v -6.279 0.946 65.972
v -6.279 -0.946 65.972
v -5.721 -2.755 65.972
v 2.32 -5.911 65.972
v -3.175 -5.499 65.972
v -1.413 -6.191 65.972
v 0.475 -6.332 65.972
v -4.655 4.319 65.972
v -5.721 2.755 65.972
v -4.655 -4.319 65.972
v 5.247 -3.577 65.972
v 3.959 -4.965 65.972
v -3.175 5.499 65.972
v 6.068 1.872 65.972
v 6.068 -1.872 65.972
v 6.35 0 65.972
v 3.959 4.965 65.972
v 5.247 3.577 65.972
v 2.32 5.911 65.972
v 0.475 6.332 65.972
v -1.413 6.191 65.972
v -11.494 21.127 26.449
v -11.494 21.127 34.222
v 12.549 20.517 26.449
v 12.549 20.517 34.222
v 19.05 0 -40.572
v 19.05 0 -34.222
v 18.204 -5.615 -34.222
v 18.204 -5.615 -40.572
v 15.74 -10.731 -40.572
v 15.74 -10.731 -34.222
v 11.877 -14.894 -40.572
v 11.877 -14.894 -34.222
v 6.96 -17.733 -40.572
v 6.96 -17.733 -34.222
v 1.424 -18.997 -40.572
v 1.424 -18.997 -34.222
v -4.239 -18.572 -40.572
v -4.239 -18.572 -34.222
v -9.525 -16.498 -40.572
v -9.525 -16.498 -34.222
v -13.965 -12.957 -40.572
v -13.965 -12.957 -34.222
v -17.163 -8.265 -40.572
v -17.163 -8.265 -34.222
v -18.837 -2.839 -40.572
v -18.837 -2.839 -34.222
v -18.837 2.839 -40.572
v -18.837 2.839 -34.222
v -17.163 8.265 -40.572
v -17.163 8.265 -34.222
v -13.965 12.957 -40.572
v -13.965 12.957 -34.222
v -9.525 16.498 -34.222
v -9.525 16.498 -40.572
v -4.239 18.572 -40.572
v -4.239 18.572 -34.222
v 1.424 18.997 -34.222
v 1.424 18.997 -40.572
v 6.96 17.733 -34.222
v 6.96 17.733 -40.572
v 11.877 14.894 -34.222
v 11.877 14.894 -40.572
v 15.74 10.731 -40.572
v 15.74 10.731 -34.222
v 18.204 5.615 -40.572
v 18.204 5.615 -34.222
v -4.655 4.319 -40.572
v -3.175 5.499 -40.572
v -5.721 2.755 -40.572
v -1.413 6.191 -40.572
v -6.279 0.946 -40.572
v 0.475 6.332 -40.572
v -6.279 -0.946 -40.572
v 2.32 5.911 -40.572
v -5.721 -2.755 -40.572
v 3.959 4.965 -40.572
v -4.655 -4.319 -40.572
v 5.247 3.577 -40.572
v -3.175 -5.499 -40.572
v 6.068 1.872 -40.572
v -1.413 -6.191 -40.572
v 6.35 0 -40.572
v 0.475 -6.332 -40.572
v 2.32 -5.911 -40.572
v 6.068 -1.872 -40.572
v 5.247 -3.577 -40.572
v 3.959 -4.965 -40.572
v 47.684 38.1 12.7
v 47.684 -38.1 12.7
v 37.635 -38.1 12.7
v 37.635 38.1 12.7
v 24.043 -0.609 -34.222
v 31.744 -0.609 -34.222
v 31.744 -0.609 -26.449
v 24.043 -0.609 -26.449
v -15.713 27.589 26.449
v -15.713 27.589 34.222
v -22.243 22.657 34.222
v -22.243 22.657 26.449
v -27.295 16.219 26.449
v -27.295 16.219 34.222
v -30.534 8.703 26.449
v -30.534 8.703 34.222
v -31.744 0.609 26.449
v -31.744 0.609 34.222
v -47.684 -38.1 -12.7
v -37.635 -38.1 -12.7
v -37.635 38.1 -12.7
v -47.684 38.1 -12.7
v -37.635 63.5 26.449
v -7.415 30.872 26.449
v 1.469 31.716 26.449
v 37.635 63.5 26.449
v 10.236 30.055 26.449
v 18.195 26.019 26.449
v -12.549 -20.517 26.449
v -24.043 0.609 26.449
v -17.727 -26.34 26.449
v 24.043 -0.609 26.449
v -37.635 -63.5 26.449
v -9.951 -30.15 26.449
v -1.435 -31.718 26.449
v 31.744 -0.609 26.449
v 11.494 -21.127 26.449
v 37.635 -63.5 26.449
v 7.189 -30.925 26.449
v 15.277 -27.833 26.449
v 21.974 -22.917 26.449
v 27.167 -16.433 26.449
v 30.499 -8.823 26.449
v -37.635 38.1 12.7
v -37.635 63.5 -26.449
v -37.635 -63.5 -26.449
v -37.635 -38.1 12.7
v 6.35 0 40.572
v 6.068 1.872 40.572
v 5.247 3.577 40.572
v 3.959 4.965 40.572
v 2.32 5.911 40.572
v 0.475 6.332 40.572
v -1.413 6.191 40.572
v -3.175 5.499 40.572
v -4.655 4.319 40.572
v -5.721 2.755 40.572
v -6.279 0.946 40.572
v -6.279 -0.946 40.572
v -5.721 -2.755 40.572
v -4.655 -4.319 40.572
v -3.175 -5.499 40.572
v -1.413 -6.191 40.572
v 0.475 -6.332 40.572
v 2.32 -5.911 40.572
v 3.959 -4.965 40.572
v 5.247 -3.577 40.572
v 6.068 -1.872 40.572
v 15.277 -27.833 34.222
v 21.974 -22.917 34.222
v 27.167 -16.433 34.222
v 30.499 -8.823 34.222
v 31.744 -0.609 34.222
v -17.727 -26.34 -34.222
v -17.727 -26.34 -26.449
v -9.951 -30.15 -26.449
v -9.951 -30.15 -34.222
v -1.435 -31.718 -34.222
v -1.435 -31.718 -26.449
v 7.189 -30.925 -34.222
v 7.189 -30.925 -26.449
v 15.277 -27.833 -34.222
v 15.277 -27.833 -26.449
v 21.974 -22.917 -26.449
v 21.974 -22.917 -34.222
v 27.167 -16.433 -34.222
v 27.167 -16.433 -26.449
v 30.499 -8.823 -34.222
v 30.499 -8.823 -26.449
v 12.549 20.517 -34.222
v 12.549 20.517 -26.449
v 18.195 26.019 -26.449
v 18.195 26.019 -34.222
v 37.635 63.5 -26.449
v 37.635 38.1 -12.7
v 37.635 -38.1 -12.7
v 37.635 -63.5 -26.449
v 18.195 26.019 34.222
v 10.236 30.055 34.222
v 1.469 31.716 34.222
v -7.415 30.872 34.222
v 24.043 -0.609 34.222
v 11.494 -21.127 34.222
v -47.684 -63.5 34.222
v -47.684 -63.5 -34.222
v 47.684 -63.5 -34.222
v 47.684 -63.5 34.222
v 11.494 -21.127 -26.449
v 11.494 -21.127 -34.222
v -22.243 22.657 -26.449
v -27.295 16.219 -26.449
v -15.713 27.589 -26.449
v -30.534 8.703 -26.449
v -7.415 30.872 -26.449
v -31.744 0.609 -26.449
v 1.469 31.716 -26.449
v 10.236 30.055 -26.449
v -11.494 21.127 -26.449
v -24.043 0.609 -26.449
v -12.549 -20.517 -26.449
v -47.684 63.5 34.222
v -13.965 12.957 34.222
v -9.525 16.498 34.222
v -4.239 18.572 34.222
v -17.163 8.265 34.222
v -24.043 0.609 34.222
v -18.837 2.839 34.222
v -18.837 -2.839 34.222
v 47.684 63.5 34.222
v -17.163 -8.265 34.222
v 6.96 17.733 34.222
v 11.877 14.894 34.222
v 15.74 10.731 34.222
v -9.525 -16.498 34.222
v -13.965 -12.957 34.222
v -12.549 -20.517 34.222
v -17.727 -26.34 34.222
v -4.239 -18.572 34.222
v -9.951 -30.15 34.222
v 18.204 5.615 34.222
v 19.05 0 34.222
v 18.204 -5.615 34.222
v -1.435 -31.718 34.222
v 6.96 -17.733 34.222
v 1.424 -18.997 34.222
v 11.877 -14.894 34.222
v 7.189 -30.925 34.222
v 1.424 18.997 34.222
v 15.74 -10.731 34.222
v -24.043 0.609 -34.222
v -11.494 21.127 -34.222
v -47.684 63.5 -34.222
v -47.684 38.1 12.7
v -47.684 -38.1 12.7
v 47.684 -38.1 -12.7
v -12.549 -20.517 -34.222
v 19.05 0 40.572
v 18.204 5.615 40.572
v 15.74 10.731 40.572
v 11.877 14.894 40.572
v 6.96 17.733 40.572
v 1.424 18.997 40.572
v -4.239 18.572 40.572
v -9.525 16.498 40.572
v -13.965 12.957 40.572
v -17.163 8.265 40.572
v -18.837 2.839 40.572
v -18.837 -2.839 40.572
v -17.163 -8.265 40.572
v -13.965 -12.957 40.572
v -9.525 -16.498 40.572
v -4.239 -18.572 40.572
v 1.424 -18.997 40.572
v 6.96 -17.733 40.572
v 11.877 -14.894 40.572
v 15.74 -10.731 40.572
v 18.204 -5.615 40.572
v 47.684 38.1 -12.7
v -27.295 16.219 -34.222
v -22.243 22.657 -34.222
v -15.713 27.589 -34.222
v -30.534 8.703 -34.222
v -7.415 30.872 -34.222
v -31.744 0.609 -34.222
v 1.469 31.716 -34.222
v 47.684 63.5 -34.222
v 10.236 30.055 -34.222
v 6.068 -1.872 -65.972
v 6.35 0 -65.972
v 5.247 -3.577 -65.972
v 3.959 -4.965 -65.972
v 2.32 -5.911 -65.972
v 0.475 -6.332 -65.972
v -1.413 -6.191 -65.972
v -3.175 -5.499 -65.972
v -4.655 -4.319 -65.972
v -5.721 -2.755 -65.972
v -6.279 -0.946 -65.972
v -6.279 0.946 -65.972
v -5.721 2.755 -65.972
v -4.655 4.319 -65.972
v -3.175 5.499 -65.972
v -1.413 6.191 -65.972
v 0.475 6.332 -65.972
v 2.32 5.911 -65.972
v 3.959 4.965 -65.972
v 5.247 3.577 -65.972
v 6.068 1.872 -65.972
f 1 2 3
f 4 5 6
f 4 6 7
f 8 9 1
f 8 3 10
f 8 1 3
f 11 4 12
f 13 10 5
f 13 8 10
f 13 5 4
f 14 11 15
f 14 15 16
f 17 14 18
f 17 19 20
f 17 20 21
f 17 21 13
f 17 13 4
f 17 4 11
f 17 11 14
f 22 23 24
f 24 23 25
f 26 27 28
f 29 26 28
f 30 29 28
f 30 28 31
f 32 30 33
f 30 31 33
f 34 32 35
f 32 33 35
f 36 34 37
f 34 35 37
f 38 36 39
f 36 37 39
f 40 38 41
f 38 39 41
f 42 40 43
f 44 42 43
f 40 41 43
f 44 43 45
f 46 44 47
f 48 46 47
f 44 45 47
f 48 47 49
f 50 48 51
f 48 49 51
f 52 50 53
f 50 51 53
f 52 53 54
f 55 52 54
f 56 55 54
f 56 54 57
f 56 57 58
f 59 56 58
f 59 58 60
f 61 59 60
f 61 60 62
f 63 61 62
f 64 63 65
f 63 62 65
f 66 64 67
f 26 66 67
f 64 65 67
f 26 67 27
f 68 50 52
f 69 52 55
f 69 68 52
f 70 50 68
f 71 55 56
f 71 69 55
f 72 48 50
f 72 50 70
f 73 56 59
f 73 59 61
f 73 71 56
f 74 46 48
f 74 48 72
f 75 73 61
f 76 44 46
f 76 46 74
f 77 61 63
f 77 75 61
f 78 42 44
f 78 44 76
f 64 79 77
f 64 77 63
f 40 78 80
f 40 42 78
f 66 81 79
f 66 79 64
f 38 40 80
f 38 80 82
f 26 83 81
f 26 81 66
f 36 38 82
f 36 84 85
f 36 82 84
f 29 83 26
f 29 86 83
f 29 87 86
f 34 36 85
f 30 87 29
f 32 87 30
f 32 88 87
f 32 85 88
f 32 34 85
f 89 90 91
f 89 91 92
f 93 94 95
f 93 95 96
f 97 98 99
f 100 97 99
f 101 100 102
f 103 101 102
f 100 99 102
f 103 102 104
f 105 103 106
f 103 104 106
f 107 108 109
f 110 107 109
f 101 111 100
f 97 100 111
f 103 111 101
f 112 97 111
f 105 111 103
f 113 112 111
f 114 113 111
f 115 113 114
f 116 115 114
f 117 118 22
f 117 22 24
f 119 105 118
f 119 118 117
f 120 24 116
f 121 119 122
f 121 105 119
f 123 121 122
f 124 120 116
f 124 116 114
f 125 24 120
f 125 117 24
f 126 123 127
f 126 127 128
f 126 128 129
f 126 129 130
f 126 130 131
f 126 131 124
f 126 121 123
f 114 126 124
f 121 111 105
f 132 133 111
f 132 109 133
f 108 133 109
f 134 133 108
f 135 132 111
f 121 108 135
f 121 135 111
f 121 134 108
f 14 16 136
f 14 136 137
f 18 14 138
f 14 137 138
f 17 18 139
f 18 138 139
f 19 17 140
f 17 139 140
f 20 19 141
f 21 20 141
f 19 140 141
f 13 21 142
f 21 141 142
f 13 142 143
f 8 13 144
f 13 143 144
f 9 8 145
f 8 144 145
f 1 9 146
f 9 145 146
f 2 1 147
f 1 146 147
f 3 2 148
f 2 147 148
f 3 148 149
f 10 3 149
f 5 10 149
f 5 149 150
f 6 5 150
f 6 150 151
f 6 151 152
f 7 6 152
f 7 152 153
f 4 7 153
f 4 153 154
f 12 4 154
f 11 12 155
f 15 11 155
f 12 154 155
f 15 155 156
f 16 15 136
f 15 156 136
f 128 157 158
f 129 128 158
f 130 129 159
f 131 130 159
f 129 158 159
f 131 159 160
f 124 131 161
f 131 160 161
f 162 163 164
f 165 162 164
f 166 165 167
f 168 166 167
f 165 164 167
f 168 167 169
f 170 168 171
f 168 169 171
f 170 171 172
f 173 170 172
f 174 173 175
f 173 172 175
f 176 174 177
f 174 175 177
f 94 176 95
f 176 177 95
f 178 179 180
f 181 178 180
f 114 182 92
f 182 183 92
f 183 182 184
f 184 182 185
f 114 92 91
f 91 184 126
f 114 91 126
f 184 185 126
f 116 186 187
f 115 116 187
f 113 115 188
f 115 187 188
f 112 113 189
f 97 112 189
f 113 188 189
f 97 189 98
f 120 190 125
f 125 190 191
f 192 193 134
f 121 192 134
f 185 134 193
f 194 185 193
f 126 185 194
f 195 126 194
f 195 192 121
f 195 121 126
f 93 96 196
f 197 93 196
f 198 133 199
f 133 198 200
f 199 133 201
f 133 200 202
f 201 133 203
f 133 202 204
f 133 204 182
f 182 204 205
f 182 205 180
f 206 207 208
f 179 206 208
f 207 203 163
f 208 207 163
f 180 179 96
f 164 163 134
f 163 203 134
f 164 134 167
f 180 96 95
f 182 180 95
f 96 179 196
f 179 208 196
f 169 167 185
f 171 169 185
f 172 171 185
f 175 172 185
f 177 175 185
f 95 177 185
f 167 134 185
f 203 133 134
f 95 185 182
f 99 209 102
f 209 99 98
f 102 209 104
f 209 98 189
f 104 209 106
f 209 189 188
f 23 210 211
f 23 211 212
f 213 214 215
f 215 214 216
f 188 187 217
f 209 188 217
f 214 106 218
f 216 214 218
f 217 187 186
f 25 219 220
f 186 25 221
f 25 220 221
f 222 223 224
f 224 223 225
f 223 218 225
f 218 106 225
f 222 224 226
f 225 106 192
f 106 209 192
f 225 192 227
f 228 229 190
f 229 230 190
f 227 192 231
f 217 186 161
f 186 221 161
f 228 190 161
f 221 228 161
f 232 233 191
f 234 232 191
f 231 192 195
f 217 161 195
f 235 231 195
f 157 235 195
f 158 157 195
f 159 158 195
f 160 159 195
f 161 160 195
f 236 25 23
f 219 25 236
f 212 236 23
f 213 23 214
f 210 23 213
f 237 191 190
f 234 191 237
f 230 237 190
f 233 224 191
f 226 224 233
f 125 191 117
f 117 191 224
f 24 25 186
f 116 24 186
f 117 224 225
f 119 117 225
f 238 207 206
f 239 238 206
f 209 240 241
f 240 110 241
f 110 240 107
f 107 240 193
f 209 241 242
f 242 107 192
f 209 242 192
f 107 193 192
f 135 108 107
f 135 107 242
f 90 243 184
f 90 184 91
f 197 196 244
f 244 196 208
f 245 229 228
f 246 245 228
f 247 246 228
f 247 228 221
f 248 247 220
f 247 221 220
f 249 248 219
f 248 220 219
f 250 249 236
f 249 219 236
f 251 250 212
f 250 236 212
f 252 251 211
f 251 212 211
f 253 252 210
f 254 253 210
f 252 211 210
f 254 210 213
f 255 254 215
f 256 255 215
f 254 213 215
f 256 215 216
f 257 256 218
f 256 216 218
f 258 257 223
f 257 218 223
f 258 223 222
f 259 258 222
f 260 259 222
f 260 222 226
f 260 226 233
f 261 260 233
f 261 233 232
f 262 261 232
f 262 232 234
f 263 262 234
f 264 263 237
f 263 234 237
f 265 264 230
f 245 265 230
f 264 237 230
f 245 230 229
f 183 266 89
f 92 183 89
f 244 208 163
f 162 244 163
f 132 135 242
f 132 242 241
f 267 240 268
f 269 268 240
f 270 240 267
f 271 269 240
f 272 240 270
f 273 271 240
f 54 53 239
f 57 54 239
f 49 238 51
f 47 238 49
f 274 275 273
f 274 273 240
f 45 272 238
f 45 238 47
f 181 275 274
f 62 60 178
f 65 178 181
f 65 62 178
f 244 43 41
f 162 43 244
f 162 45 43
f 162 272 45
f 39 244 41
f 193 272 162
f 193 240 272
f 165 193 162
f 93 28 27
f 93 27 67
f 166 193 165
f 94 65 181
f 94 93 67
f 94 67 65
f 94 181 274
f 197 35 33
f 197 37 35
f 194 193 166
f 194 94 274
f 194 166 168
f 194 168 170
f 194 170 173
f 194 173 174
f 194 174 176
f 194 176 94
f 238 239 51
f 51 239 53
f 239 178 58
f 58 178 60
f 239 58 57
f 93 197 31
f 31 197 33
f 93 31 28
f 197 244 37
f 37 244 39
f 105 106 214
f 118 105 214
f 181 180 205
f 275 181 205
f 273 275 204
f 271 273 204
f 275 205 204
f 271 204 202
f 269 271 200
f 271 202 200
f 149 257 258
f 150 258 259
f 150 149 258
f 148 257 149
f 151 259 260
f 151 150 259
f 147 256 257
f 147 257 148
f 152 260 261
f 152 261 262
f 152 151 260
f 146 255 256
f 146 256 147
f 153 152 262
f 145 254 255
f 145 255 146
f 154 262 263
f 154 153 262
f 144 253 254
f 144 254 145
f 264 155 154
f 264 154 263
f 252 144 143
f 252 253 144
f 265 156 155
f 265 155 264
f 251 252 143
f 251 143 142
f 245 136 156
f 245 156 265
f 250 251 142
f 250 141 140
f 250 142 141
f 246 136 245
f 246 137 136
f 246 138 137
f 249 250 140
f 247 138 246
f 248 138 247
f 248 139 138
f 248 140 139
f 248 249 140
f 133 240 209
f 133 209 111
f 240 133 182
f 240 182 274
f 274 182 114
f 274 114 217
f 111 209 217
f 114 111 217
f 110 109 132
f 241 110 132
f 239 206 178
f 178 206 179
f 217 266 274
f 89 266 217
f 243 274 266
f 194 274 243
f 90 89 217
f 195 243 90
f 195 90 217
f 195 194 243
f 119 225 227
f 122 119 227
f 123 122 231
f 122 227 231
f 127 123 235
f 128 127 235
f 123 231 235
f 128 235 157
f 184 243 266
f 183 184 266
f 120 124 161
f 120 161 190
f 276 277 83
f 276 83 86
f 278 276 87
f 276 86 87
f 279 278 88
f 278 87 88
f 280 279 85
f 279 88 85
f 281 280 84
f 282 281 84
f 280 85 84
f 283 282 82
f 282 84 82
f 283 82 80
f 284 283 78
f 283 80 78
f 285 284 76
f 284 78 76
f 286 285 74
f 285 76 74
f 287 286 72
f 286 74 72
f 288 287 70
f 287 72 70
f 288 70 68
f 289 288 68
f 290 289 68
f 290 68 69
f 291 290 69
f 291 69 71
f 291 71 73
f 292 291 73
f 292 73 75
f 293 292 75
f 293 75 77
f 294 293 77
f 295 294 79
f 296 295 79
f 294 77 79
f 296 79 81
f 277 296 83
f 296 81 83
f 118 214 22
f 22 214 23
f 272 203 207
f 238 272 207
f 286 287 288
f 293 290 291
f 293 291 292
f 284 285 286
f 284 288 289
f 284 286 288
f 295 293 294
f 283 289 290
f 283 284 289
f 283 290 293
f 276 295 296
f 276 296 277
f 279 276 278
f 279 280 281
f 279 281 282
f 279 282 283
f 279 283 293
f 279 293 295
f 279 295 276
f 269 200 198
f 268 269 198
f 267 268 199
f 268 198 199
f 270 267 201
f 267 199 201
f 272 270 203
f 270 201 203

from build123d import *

# Parameters (mm, degrees)
F0_W      = 95.367364
F0_H      = 68.444572
F0_W_2    = 75.270072
F0_H_2    = 52.89761
F1_DEPTH  = 63.5
F3_DEPTH  = 68.445572
F4_R      = 19.05
F5_DEPTH  = 6.35
F6_R      = 19.05
F7_DEPTH  = 6.35
F8_W      = 76.2
F8_H      = 25.4
F9_DEPTH  = 95.368365
F10_R     = 6.35
F11_DEPTH = 25.4
F12_R     = 6.35
F13_DEPTH = 25.4


with BuildPart() as f1:
    # F0 (on Front) → F1 (new body, symmetric)
    with BuildSketch(Plane.XZ):
        Rectangle(F0_W, F0_H)
        Rectangle(F0_W_2, F0_H_2, mode=Mode.SUBTRACT)
    extrude(amount=F1_DEPTH, both=True)

    # F2 (on face) → F3 (cut, through all)
    with BuildSketch(Plane.XY.offset(34.222286)):
        with BuildLine():
            Line((12.549268, 20.517124), (18.195216, 26.019158))
            ThreePointArc((18.195216, 26.019158), (1.468591, 31.716017), (-15.712911, 27.589254))
            Line((-15.712911, 27.589254), (-11.493717, 21.126547))
            Line((-11.493717, 21.126547), (12.549268, 20.517124))
        make_face()
        with BuildLine():
            Line((-11.493717, 21.126547), (-15.712911, 27.589254))
            ThreePointArc((-15.712911, 27.589254), (-27.295073, 16.218554), (-31.744151, 0.609423))
            Line((-31.744151, 0.609423), (-24.042985, 0.609423))
            Line((-24.042985, 0.609423), (-11.493717, 21.126547))
        make_face()
        with BuildLine():
            ThreePointArc((-17.727481, -26.340063), (-1.43464, -31.717571), (15.277143, -27.832919))
            Line((15.277143, -27.832919), (11.493717, -21.126547))
            Line((11.493717, -21.126547), (-12.549268, -20.517124))
            Line((-12.549268, -20.517124), (-17.727481, -26.340063))
        make_face()
        with BuildLine():
            ThreePointArc((15.277143, -27.832919), (27.166712, -16.432659), (31.744151, -0.609423))
            Line((31.744151, -0.609423), (24.042985, -0.609423))
            Line((24.042985, -0.609423), (11.493717, -21.126547))
            Line((11.493717, -21.126547), (15.277143, -27.832919))
        make_face()
    extrude(amount=-F3_DEPTH, mode=Mode.SUBTRACT)

    # F4 (on face) → F5 (join)
    with BuildSketch(Plane.XY.offset(34.222286)):
        Circle(F4_R)
    extrude(amount=F5_DEPTH)

    # F6 (on face) → F7 (join)
    with BuildSketch(Plane(origin=(0, 0, -34.222286), x_dir=(1, 0, 0), z_dir=(0, 0, -1))):
        Circle(F6_R)
    extrude(amount=F7_DEPTH)

    # F8 (on face) → F9 (cut, through all)
    with BuildSketch(Plane.YZ.offset(47.683682)):
        Rectangle(F8_W, F8_H)
    extrude(amount=-F9_DEPTH, mode=Mode.SUBTRACT)

    # F10 (on face) → F11 (join)
    with BuildSketch(Plane.XY.offset(40.572286)):
        Circle(F10_R)
    extrude(amount=F11_DEPTH)

    # F12 (on face) → F13 (join)
    with BuildSketch(Plane(origin=(0, 0, -40.572286), x_dir=(1, 0, 0), z_dir=(0, 0, -1))):
        Circle(F12_R)
    extrude(amount=F13_DEPTH)


solid = f1.part
